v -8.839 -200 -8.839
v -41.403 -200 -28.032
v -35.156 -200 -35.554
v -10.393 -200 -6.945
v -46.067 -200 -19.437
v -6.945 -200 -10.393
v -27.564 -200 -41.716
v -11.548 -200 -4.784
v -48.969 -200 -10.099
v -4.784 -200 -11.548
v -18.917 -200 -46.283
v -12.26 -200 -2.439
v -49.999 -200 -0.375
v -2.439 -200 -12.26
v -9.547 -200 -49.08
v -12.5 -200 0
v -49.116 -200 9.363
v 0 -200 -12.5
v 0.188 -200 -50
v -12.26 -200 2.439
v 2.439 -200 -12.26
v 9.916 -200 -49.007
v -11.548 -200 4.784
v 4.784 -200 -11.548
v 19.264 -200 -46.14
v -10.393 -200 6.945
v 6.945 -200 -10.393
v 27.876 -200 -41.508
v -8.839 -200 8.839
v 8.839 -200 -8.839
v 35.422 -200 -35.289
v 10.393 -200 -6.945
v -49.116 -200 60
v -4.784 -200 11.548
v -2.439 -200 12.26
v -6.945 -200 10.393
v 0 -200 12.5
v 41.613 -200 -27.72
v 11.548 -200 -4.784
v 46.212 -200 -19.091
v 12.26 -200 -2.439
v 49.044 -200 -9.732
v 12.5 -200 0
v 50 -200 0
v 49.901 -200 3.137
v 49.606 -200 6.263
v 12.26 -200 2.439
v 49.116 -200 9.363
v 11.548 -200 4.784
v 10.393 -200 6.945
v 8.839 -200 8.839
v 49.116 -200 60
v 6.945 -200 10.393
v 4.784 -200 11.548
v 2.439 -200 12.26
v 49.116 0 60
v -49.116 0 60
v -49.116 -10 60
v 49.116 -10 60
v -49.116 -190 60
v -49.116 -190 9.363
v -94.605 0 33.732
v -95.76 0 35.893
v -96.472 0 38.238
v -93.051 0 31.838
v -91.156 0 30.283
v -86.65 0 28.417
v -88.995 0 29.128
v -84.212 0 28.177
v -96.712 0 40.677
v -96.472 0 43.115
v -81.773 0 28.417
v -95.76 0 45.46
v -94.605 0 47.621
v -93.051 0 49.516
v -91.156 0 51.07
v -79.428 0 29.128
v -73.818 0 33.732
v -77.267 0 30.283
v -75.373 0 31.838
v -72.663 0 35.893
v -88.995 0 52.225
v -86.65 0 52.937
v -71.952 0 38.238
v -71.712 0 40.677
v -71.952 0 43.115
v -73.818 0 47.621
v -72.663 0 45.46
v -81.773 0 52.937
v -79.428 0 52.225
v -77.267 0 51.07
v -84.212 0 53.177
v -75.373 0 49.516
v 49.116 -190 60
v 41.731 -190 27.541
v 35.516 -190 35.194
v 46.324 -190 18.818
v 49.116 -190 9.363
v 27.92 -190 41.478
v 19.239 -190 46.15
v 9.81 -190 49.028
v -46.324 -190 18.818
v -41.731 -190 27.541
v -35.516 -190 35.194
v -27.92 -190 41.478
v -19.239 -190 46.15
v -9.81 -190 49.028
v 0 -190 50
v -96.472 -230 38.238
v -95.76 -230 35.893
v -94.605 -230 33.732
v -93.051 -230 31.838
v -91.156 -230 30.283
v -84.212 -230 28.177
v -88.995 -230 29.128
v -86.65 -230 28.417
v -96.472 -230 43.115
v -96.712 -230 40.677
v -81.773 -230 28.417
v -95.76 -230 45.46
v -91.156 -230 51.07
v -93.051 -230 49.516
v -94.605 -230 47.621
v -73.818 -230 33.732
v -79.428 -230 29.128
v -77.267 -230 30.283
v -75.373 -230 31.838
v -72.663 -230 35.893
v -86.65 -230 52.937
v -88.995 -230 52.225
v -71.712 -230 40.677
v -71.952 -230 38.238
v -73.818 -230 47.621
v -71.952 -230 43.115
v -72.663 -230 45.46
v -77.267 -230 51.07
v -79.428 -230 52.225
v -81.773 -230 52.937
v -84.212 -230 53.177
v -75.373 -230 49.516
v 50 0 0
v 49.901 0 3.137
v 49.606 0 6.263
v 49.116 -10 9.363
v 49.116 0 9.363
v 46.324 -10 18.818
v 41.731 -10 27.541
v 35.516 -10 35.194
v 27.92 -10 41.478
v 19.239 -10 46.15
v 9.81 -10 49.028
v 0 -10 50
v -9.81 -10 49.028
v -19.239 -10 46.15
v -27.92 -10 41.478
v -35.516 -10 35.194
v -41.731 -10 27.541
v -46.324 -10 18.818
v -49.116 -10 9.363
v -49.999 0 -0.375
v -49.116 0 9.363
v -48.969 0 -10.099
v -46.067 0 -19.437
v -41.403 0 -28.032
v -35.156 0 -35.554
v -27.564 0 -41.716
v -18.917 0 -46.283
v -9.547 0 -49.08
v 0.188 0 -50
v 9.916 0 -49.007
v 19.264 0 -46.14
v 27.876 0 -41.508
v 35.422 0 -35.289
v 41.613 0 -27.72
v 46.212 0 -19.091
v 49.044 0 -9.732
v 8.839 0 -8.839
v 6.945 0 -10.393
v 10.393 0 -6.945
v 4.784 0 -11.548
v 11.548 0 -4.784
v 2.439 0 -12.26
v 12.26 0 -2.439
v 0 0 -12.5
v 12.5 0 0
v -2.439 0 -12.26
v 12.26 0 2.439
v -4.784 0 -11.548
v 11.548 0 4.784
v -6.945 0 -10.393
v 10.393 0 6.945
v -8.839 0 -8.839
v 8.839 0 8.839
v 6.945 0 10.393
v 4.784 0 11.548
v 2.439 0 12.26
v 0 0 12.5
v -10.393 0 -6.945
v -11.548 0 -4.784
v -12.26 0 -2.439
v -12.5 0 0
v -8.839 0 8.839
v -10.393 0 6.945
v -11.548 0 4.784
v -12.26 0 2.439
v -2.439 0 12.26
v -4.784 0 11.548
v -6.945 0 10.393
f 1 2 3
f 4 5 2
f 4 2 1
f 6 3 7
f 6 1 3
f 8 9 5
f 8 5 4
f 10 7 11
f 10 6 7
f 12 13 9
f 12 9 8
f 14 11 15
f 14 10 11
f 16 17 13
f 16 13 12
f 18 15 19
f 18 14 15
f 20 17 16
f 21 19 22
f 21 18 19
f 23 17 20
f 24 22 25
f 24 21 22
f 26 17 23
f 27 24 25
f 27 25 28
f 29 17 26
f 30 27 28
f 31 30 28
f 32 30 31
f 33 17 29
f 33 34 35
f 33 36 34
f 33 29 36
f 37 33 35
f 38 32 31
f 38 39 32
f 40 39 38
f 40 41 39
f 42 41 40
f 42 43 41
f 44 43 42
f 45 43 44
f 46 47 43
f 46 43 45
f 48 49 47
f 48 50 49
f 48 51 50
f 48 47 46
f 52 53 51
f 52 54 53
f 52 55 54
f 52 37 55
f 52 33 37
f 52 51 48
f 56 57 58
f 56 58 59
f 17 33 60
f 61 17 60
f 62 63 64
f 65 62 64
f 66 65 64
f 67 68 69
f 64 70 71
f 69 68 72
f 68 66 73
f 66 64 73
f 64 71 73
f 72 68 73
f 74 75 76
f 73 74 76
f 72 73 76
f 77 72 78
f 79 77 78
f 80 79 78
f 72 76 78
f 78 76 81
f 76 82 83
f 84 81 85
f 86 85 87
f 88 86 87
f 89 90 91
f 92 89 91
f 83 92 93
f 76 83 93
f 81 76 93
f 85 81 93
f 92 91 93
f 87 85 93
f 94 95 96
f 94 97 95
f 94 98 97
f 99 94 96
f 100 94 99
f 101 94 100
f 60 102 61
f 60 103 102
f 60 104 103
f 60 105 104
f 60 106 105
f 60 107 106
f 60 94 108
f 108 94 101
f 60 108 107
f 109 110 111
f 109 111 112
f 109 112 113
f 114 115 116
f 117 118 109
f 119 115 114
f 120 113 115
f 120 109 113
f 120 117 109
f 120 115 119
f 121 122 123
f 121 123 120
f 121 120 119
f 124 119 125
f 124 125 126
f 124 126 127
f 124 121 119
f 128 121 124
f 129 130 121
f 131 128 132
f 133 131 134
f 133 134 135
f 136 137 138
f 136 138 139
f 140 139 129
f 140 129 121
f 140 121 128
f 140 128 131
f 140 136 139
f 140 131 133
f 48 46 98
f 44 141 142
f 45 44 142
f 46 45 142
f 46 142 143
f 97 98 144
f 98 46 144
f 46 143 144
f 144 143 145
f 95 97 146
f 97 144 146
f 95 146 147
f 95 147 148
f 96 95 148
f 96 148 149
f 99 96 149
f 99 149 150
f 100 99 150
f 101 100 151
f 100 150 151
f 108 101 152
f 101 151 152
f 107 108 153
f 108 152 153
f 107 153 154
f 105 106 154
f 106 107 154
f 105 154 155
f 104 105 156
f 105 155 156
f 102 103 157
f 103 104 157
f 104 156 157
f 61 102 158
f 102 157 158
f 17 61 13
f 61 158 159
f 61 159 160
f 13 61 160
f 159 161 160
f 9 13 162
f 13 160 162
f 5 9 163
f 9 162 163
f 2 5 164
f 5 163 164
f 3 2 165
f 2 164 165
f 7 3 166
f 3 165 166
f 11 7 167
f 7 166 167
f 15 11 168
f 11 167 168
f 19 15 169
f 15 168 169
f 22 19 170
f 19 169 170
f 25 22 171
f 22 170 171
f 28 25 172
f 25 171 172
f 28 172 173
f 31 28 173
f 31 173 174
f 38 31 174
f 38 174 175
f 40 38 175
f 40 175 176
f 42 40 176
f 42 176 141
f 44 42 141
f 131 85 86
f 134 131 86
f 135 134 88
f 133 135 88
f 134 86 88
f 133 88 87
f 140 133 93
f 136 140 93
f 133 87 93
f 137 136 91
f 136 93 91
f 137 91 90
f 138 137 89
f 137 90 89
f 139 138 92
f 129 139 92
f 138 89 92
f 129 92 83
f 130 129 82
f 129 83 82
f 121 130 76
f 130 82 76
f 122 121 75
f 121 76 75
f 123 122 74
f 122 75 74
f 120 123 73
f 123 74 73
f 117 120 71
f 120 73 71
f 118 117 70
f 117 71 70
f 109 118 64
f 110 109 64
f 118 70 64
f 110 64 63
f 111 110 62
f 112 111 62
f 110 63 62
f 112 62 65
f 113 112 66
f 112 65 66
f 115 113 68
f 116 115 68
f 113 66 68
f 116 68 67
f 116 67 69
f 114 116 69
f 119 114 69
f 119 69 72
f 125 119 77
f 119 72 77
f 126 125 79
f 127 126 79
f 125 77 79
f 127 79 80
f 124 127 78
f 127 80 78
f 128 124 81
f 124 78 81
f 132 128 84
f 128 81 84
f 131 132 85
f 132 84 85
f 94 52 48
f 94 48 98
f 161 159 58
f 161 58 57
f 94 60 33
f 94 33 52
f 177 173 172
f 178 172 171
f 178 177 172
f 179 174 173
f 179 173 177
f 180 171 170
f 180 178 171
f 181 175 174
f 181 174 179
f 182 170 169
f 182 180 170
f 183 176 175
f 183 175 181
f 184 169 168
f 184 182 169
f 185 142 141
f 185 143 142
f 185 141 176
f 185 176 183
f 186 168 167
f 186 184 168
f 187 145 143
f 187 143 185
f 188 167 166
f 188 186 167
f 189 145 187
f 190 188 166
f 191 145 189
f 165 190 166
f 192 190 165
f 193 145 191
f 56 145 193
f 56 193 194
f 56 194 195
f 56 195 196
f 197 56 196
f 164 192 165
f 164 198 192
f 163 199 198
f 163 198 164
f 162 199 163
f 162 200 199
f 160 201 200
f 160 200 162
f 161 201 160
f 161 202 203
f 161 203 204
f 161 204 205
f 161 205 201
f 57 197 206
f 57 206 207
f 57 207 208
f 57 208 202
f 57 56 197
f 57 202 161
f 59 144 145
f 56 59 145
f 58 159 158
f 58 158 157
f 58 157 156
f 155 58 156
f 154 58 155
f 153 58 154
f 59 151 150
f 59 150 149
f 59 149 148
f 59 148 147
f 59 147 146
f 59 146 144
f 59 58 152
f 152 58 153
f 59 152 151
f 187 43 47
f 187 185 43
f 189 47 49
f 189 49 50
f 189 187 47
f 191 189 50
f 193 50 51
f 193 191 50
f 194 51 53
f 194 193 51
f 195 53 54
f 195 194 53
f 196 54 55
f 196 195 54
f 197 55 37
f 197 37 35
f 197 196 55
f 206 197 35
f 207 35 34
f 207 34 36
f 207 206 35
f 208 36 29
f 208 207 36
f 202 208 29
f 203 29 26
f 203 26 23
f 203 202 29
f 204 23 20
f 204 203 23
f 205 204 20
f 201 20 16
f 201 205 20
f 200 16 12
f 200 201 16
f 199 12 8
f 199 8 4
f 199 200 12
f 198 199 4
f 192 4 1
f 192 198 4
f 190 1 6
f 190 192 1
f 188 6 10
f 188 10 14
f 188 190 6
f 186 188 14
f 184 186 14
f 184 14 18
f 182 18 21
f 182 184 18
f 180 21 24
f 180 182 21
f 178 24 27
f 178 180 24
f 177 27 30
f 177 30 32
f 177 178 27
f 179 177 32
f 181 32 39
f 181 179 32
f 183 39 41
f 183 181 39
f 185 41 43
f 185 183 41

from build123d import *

# Parameters (mm, degrees)
F0_R     = 12.5
F1_DEPTH = 230
F0_R_2   = 50
F2_DEPTH = 200
F4_W     = 49.115509
F4_H     = 10
F5_DEPTH = 55
F6_DEPTH = 264


with BuildPart() as f1:
    # F0 (on Front) → F1 (new body)
    with BuildSketch(Plane.XZ):
        with Locations((-84.211826, 40.676731)):
            Circle(F0_R)
    extrude(amount=F1_DEPTH)


with BuildPart() as f2:
    # F0 (on Front) → F2 (new body)
    with BuildSketch(Plane.XZ):
        Circle(F0_R_2)
        Circle(F0_R, mode=Mode.SUBTRACT)
    extrude(amount=F2_DEPTH)

    # F4 (on offset) → F5 (join)
    with BuildSketch(Plane.XY.offset(60)):
        with Locations((24.557754, -5)):
            Rectangle(F4_W, F4_H)
        with Locations((24.557754, -195)):
            Rectangle(F4_W, F4_H)
        with Locations((-24.557754, -195)):
            Rectangle(F4_W, F4_H)
        with Locations((-24.557754, -5)):
            Rectangle(F4_W, F4_H)
    extrude(amount=-F5_DEPTH)

    # F0 (on Front) → F6 (cut)
    with BuildSketch(Plane.XZ):
        Circle(F0_R)
    extrude(amount=F6_DEPTH, mode=Mode.SUBTRACT)


solid = Compound([f1.part, f2.part])
